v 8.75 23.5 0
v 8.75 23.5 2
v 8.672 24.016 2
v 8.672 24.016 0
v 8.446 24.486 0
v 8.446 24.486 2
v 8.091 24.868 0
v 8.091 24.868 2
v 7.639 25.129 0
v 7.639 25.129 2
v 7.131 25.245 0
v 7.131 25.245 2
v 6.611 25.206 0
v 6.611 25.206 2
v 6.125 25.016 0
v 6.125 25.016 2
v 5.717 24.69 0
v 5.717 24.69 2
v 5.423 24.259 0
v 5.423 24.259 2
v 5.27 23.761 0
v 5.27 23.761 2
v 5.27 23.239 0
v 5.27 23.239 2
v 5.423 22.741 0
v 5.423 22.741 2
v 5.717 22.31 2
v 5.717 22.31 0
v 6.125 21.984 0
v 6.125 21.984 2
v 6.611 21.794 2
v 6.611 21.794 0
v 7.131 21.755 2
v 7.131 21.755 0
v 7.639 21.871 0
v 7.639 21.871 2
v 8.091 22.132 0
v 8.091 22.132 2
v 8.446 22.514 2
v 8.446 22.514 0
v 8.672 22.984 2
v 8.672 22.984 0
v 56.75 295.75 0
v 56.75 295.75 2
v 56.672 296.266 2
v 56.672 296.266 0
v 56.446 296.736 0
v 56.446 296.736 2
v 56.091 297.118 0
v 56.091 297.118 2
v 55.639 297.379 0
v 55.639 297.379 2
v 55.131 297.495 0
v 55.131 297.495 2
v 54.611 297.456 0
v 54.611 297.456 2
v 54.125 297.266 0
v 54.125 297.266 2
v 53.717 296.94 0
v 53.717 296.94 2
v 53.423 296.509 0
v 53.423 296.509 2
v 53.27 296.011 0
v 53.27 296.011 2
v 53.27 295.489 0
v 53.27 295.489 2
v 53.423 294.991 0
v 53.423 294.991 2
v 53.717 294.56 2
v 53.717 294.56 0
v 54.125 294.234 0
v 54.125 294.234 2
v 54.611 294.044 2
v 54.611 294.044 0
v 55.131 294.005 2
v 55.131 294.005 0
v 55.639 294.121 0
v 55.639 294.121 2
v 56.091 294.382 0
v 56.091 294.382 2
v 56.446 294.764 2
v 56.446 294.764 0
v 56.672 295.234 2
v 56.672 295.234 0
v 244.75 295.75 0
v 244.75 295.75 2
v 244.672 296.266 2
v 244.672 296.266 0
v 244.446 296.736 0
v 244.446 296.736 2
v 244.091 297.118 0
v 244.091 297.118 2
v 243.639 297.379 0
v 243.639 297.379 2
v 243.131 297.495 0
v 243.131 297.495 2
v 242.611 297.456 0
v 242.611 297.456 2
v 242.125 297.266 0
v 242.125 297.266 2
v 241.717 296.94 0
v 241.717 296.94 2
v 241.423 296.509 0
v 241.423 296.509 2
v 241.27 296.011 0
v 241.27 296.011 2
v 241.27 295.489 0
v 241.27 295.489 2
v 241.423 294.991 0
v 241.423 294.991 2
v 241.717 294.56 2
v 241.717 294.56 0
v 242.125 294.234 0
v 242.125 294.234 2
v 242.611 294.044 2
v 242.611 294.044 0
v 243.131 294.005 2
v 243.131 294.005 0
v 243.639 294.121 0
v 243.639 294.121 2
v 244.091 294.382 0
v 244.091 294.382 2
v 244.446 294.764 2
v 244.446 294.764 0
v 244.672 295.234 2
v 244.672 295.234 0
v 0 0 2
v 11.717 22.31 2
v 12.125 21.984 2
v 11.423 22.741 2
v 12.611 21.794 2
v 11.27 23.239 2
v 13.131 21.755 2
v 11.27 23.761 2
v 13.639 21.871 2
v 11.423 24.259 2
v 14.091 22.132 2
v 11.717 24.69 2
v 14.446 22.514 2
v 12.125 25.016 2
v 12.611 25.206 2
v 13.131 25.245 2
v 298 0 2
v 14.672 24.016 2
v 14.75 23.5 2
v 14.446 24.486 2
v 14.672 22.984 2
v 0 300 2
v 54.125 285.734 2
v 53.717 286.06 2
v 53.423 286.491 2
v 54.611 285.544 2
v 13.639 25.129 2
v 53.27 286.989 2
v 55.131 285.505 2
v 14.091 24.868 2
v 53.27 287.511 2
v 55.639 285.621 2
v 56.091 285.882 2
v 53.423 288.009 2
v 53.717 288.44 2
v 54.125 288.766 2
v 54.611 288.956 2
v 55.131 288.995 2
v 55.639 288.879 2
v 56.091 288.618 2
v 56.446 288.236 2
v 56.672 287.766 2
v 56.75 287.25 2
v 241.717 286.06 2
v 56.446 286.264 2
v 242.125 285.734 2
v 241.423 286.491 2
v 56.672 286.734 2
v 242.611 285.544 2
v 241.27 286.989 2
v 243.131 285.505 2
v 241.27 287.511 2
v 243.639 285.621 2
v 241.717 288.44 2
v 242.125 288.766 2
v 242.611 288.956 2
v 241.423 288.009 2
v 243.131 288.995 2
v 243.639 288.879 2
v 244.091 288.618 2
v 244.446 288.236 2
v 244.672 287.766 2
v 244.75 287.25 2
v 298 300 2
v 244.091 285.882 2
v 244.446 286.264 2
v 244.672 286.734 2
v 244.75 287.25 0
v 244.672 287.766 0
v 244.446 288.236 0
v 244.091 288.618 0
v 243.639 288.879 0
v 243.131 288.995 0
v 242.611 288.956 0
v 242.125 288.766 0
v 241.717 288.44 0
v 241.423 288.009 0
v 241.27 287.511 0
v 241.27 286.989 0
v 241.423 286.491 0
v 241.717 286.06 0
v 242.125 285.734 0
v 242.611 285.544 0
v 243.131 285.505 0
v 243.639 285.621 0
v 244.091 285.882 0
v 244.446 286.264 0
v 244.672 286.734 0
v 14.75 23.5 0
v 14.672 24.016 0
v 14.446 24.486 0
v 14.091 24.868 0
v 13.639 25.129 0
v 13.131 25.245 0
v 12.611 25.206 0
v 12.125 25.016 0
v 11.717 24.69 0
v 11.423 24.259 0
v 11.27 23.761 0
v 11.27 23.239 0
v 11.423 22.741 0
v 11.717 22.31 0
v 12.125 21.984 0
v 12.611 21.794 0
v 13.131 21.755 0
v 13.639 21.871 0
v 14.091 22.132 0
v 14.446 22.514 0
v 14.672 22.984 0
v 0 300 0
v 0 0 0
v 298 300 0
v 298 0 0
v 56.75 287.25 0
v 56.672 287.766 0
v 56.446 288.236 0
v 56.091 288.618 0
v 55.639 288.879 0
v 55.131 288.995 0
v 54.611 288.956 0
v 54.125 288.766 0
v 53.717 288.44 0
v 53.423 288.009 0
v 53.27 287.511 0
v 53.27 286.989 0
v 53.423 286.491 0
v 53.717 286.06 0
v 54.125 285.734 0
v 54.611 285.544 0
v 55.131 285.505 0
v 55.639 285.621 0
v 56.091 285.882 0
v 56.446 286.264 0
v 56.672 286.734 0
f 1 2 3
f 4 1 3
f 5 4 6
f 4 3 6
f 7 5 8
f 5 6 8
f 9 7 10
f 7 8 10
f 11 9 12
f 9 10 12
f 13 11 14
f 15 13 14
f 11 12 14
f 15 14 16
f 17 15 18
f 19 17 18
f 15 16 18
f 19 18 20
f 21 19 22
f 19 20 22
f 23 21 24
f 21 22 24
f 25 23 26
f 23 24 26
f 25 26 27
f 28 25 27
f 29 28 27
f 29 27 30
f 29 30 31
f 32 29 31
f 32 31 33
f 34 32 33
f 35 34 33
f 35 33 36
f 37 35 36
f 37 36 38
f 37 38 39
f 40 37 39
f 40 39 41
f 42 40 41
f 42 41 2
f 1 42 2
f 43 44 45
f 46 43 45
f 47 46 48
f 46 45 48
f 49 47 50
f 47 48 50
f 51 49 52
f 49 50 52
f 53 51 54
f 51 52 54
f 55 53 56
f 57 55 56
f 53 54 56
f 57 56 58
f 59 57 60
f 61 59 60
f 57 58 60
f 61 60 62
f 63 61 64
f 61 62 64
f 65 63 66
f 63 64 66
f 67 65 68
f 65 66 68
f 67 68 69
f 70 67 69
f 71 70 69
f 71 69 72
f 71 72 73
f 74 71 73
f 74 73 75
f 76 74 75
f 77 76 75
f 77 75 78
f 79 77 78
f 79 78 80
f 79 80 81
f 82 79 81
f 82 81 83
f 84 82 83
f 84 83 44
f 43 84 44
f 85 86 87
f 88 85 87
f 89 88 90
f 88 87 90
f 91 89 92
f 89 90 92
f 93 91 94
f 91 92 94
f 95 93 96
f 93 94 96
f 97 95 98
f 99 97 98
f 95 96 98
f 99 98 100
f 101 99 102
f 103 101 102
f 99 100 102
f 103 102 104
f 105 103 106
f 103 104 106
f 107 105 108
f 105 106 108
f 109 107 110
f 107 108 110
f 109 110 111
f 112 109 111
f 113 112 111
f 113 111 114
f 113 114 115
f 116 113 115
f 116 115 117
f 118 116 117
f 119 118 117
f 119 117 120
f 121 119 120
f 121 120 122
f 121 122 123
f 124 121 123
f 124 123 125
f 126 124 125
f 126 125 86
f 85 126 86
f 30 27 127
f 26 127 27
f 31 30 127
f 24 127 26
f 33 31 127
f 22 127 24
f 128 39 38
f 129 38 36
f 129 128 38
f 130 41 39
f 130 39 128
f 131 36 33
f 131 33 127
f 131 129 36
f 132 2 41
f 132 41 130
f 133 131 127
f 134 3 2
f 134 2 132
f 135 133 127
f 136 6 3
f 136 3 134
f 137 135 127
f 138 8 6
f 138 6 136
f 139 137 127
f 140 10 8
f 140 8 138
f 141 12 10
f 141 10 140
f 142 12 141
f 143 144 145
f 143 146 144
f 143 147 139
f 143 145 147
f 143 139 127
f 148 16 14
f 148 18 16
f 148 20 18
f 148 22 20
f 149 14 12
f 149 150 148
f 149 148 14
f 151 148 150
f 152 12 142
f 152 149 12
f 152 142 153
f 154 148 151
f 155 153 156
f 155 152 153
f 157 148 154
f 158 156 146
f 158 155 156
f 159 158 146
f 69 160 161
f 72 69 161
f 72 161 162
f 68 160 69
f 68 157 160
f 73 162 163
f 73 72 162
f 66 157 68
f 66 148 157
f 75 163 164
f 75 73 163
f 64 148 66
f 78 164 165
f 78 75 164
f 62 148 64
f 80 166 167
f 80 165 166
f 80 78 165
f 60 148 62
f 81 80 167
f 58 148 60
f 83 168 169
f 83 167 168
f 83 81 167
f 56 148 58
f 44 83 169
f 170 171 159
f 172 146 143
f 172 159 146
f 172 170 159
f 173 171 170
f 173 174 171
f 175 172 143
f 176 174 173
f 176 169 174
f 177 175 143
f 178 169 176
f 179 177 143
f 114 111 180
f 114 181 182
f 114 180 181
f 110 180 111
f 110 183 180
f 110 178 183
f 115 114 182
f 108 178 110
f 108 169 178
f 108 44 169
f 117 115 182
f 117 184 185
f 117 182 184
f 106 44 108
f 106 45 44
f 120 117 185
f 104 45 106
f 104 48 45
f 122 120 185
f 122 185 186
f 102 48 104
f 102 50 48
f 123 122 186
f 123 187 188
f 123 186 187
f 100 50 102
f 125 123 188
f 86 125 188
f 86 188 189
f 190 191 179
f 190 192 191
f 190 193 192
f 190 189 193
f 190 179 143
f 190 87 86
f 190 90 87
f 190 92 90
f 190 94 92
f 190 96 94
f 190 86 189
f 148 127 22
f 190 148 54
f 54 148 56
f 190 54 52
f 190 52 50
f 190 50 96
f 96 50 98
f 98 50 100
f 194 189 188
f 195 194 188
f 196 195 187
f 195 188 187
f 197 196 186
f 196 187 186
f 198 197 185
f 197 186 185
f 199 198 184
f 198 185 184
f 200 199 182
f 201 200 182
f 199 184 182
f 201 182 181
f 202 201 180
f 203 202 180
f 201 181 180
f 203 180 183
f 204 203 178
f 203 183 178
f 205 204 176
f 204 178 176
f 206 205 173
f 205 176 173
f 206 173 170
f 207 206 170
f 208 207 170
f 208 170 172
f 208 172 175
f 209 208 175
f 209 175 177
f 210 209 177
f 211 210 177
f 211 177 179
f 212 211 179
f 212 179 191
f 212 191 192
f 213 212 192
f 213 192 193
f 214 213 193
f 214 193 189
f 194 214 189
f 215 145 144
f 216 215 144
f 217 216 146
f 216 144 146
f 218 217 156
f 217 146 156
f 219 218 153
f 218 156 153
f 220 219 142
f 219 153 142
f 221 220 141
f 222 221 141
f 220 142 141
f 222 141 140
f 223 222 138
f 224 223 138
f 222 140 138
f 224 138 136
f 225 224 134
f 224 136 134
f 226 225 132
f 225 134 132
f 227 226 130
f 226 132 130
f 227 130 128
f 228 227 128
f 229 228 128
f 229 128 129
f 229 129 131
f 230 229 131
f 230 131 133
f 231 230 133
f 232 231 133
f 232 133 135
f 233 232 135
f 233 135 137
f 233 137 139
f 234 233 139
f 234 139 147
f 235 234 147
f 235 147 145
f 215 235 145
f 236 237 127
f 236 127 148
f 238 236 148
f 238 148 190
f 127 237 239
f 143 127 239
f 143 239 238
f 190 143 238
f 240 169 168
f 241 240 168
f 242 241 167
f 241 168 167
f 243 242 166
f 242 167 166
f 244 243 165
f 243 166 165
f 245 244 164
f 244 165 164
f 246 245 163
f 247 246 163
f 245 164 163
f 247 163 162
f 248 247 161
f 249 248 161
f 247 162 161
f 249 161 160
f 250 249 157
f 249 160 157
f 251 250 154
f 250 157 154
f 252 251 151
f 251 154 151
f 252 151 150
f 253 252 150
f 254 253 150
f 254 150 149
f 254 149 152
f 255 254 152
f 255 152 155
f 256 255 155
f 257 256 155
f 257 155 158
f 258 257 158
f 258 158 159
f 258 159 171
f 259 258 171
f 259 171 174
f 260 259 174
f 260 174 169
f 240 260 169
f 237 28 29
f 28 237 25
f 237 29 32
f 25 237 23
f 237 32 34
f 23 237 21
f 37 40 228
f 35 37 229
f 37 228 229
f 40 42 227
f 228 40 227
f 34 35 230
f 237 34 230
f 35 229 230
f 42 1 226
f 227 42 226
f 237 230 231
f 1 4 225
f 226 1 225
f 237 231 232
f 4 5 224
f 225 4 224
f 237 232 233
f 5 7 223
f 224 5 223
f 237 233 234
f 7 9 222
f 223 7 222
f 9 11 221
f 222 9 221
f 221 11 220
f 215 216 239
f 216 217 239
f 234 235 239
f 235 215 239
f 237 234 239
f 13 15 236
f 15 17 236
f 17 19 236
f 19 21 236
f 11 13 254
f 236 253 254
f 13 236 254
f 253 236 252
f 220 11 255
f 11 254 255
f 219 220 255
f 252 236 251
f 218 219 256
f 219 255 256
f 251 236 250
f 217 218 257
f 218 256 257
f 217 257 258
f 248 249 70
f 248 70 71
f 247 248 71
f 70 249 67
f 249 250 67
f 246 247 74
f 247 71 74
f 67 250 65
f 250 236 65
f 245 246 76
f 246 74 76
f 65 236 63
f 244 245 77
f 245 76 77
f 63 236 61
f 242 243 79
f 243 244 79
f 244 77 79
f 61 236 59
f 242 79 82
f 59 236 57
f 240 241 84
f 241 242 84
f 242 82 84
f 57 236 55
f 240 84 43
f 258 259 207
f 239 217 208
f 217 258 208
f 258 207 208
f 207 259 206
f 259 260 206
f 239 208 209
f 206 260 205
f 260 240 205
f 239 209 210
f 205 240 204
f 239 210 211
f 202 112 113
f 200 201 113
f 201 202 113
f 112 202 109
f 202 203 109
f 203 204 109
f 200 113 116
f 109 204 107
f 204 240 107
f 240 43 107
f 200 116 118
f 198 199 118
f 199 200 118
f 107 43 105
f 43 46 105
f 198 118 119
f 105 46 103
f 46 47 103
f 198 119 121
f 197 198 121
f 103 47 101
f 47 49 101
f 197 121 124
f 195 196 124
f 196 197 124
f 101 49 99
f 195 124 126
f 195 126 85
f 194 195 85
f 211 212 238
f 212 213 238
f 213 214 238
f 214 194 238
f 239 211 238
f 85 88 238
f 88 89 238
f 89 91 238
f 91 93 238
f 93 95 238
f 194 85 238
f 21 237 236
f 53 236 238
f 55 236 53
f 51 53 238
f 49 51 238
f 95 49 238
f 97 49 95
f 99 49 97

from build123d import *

# Parameters (mm, degrees)
SKETCH1_W               = 298
SKETCH1_H               = 300
BOSS_EXTRUDE1_DEPTH     = 2
SKETCH2_R               = 1.75
CUT_EXTRUDE1_DEPTH      = 20
SKETCH3_R               = 1.75
CUT_EXTRUDE2_DEPTH      = 1
CUT_EXTRUDE2_DEPTH_BACK = 3
SKETCH5_R               = 1.75
CUT_EXTRUDE3_DEPTH      = 3


with BuildPart() as part:
    # Sketch1 → Boss-Extrude1 (new body)
    with BuildSketch(Plane.XY):
        with Locations((149, 150)):
            Rectangle(SKETCH1_W, SKETCH1_H)
    extrude(amount=BOSS_EXTRUDE1_DEPTH)

    # Sketch2 → Cut-Extrude1 (cut)
    with BuildSketch(Plane.XY.offset(2)):
        with Locations((243, 295.75)):
            Circle(SKETCH2_R)
        with Locations((243, 287.25)):
            Circle(SKETCH2_R)
    extrude(amount=-CUT_EXTRUDE1_DEPTH, mode=Mode.SUBTRACT)

    # Sketch3 → Cut-Extrude2 (cut, two sides)
    with BuildSketch(Plane.XY.offset(2)) as cut_extrude2_sk:
        with Locations((55, 287.25)):
            Circle(SKETCH3_R)
        with Locations((55, 295.75)):
            Circle(SKETCH3_R)
    extrude(amount=CUT_EXTRUDE2_DEPTH, mode=Mode.SUBTRACT)
    extrude(cut_extrude2_sk.sketch, amount=-CUT_EXTRUDE2_DEPTH_BACK, mode=Mode.SUBTRACT)

    # Sketch5 → Cut-Extrude3 (cut, through all)
    with BuildSketch(Plane.XY.offset(2)):
        with Locations((7, 23.5)):
            Circle(SKETCH5_R)
        with Locations((13, 23.5)):
            Circle(SKETCH5_R)
    extrude(amount=-CUT_EXTRUDE3_DEPTH, mode=Mode.SUBTRACT)


solid = part.part
